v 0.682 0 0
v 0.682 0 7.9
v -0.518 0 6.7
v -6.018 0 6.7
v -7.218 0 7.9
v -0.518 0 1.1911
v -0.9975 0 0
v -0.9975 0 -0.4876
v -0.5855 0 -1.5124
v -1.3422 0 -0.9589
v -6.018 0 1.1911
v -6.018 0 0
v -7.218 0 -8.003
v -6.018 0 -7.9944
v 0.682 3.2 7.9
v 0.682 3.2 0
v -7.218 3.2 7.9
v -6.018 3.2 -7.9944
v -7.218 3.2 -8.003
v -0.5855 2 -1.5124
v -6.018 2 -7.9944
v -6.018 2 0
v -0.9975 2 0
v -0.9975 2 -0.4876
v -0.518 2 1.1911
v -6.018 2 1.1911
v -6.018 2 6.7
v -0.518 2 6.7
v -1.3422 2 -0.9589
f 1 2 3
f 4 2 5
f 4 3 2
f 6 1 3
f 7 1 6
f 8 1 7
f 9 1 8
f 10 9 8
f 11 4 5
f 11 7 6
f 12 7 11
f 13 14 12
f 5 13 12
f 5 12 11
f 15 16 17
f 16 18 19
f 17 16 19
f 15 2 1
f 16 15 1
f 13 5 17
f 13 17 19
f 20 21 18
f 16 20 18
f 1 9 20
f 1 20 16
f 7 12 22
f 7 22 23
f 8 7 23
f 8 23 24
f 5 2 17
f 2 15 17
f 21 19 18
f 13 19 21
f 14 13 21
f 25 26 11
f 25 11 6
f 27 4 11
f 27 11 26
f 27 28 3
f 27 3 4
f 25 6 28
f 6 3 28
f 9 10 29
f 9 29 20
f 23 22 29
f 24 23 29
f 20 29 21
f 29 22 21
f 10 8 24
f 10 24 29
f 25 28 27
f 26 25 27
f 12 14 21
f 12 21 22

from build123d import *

# Parameters (mm, degrees)
MAINBASESKETCH_W         = 7.9
MAINBASESKETCH_H         = 3.2
MAINBASEEXTRUDE_DEPTH    = 7.9
MAINBASESHELL_T          = -1.2
SKETCH171_W              = 5.5
SKETCH171_H              = 1.191135725
BOSS_EXTRUDE23_DEPTH     = 2
CUT_EXTRUDE58_DEPTH      = 12.83470157
CUT_EXTRUDE58_DEPTH_BACK = 12.83470157
SWEEP28_DEPTH            = 3.2
PLAINHALF3_DEPTH         = 2
CUT_EXTRUDE59_DEPTH      = 13.162994561


# Read off the part's stored shape, not the designer's step: Sweep28
with BuildPart() as part:
    # MainBaseSketch → MainBaseExtrude (new, symmetric)
    with BuildSketch(Plane.XY):
        with Locations((4.631967213, 1.6)):
            Rectangle(MAINBASESKETCH_W, MAINBASESKETCH_H)
    extrude(amount=MAINBASEEXTRUDE_DEPTH, both=True)

    # MainBaseShell
    mainbaseshell_openings = [part.faces().sort_by_distance(p)[0] for p in [
        (4.631967213, 0, 0),
    ]]
    offset(amount=MAINBASESHELL_T, openings=mainbaseshell_openings, kind=Kind.INTERSECTION)

    # Sketch171 → Boss-Extrude23 (add)
    with BuildSketch(Plane(origin=(0, 2, 0), x_dir=(-1, 0, 0), z_dir=(0, -1, 0))):
        with Locations((-4.631967213, -0.595567863)):
            Rectangle(SKETCH171_W, SKETCH171_H)
    extrude(amount=BOSS_EXTRUDE23_DEPTH)

    # Sketch173 → Cut-Extrude58 (cut, two sides: drawn at the far end of the back side and taken through both)
    with BuildSketch(Plane(origin=(0, 2, 0), x_dir=(-1, 0, 0), z_dir=(0, -1, 0)).offset(-CUT_EXTRUDE58_DEPTH_BACK)):
        Polygon((-7.381967213, 0), (-8.581967213, 0), (-8.581967213, 7.9), (-0.681967213, 7.9), (-0.681967213, 0), align=None)
    extrude(amount=CUT_EXTRUDE58_DEPTH + CUT_EXTRUDE58_DEPTH_BACK, mode=Mode.SUBTRACT)

    # Sweep28 outline → Sweep28 (add)
    with BuildSketch(Plane(origin=(0, 0, 0), x_dir=(1, 0, 0), z_dir=(0, 1, 0))):
        Polygon((8.581967213, 0), (8.581967213, 8.003016647), (7.381967213, 7.994392876), (0.681967213, 0), align=None)
    extrude(amount=SWEEP28_DEPTH)

    # Sketch174 → PlainHalf3 (cut)
    with BuildSketch(Plane(origin=(0, 0, 0), x_dir=(-1, 0, 0), z_dir=(0, -1, 0))):
        Polygon((-7.381967213, 7.994392876), (-7.381967213, 1.2), (-7.381967213, 0), (-2.361390112, 0), (-2.361390112, 0.487595591), (-2.706140626, 0.958938316), (-1.846183268, 1.587930185), align=None)
    extrude(amount=-PLAINHALF3_DEPTH, mode=Mode.SUBTRACT)

    # Mirror15: part across plane


with BuildPart() as part_1:
    add(part.part)
    add(part.part.mirror(Plane.ZY.offset(-0.681967213)))

    # Sketch178 → Cut-Extrude59 (cut, through all)
    with BuildSketch(Plane(origin=(0, 0, 0), x_dir=(-1, 0, 0), z_dir=(0, -1, 0))):
        Polygon((-8.581967213, -7.9), (-0.681967213, -7.9), (-0.681967213, 0.079862465), (-7.381967213, 7.994392876), (-8.581967213, 8.003016647), align=None)
    extrude(amount=-CUT_EXTRUDE59_DEPTH, mode=Mode.SUBTRACT)


solid = part_1.part
